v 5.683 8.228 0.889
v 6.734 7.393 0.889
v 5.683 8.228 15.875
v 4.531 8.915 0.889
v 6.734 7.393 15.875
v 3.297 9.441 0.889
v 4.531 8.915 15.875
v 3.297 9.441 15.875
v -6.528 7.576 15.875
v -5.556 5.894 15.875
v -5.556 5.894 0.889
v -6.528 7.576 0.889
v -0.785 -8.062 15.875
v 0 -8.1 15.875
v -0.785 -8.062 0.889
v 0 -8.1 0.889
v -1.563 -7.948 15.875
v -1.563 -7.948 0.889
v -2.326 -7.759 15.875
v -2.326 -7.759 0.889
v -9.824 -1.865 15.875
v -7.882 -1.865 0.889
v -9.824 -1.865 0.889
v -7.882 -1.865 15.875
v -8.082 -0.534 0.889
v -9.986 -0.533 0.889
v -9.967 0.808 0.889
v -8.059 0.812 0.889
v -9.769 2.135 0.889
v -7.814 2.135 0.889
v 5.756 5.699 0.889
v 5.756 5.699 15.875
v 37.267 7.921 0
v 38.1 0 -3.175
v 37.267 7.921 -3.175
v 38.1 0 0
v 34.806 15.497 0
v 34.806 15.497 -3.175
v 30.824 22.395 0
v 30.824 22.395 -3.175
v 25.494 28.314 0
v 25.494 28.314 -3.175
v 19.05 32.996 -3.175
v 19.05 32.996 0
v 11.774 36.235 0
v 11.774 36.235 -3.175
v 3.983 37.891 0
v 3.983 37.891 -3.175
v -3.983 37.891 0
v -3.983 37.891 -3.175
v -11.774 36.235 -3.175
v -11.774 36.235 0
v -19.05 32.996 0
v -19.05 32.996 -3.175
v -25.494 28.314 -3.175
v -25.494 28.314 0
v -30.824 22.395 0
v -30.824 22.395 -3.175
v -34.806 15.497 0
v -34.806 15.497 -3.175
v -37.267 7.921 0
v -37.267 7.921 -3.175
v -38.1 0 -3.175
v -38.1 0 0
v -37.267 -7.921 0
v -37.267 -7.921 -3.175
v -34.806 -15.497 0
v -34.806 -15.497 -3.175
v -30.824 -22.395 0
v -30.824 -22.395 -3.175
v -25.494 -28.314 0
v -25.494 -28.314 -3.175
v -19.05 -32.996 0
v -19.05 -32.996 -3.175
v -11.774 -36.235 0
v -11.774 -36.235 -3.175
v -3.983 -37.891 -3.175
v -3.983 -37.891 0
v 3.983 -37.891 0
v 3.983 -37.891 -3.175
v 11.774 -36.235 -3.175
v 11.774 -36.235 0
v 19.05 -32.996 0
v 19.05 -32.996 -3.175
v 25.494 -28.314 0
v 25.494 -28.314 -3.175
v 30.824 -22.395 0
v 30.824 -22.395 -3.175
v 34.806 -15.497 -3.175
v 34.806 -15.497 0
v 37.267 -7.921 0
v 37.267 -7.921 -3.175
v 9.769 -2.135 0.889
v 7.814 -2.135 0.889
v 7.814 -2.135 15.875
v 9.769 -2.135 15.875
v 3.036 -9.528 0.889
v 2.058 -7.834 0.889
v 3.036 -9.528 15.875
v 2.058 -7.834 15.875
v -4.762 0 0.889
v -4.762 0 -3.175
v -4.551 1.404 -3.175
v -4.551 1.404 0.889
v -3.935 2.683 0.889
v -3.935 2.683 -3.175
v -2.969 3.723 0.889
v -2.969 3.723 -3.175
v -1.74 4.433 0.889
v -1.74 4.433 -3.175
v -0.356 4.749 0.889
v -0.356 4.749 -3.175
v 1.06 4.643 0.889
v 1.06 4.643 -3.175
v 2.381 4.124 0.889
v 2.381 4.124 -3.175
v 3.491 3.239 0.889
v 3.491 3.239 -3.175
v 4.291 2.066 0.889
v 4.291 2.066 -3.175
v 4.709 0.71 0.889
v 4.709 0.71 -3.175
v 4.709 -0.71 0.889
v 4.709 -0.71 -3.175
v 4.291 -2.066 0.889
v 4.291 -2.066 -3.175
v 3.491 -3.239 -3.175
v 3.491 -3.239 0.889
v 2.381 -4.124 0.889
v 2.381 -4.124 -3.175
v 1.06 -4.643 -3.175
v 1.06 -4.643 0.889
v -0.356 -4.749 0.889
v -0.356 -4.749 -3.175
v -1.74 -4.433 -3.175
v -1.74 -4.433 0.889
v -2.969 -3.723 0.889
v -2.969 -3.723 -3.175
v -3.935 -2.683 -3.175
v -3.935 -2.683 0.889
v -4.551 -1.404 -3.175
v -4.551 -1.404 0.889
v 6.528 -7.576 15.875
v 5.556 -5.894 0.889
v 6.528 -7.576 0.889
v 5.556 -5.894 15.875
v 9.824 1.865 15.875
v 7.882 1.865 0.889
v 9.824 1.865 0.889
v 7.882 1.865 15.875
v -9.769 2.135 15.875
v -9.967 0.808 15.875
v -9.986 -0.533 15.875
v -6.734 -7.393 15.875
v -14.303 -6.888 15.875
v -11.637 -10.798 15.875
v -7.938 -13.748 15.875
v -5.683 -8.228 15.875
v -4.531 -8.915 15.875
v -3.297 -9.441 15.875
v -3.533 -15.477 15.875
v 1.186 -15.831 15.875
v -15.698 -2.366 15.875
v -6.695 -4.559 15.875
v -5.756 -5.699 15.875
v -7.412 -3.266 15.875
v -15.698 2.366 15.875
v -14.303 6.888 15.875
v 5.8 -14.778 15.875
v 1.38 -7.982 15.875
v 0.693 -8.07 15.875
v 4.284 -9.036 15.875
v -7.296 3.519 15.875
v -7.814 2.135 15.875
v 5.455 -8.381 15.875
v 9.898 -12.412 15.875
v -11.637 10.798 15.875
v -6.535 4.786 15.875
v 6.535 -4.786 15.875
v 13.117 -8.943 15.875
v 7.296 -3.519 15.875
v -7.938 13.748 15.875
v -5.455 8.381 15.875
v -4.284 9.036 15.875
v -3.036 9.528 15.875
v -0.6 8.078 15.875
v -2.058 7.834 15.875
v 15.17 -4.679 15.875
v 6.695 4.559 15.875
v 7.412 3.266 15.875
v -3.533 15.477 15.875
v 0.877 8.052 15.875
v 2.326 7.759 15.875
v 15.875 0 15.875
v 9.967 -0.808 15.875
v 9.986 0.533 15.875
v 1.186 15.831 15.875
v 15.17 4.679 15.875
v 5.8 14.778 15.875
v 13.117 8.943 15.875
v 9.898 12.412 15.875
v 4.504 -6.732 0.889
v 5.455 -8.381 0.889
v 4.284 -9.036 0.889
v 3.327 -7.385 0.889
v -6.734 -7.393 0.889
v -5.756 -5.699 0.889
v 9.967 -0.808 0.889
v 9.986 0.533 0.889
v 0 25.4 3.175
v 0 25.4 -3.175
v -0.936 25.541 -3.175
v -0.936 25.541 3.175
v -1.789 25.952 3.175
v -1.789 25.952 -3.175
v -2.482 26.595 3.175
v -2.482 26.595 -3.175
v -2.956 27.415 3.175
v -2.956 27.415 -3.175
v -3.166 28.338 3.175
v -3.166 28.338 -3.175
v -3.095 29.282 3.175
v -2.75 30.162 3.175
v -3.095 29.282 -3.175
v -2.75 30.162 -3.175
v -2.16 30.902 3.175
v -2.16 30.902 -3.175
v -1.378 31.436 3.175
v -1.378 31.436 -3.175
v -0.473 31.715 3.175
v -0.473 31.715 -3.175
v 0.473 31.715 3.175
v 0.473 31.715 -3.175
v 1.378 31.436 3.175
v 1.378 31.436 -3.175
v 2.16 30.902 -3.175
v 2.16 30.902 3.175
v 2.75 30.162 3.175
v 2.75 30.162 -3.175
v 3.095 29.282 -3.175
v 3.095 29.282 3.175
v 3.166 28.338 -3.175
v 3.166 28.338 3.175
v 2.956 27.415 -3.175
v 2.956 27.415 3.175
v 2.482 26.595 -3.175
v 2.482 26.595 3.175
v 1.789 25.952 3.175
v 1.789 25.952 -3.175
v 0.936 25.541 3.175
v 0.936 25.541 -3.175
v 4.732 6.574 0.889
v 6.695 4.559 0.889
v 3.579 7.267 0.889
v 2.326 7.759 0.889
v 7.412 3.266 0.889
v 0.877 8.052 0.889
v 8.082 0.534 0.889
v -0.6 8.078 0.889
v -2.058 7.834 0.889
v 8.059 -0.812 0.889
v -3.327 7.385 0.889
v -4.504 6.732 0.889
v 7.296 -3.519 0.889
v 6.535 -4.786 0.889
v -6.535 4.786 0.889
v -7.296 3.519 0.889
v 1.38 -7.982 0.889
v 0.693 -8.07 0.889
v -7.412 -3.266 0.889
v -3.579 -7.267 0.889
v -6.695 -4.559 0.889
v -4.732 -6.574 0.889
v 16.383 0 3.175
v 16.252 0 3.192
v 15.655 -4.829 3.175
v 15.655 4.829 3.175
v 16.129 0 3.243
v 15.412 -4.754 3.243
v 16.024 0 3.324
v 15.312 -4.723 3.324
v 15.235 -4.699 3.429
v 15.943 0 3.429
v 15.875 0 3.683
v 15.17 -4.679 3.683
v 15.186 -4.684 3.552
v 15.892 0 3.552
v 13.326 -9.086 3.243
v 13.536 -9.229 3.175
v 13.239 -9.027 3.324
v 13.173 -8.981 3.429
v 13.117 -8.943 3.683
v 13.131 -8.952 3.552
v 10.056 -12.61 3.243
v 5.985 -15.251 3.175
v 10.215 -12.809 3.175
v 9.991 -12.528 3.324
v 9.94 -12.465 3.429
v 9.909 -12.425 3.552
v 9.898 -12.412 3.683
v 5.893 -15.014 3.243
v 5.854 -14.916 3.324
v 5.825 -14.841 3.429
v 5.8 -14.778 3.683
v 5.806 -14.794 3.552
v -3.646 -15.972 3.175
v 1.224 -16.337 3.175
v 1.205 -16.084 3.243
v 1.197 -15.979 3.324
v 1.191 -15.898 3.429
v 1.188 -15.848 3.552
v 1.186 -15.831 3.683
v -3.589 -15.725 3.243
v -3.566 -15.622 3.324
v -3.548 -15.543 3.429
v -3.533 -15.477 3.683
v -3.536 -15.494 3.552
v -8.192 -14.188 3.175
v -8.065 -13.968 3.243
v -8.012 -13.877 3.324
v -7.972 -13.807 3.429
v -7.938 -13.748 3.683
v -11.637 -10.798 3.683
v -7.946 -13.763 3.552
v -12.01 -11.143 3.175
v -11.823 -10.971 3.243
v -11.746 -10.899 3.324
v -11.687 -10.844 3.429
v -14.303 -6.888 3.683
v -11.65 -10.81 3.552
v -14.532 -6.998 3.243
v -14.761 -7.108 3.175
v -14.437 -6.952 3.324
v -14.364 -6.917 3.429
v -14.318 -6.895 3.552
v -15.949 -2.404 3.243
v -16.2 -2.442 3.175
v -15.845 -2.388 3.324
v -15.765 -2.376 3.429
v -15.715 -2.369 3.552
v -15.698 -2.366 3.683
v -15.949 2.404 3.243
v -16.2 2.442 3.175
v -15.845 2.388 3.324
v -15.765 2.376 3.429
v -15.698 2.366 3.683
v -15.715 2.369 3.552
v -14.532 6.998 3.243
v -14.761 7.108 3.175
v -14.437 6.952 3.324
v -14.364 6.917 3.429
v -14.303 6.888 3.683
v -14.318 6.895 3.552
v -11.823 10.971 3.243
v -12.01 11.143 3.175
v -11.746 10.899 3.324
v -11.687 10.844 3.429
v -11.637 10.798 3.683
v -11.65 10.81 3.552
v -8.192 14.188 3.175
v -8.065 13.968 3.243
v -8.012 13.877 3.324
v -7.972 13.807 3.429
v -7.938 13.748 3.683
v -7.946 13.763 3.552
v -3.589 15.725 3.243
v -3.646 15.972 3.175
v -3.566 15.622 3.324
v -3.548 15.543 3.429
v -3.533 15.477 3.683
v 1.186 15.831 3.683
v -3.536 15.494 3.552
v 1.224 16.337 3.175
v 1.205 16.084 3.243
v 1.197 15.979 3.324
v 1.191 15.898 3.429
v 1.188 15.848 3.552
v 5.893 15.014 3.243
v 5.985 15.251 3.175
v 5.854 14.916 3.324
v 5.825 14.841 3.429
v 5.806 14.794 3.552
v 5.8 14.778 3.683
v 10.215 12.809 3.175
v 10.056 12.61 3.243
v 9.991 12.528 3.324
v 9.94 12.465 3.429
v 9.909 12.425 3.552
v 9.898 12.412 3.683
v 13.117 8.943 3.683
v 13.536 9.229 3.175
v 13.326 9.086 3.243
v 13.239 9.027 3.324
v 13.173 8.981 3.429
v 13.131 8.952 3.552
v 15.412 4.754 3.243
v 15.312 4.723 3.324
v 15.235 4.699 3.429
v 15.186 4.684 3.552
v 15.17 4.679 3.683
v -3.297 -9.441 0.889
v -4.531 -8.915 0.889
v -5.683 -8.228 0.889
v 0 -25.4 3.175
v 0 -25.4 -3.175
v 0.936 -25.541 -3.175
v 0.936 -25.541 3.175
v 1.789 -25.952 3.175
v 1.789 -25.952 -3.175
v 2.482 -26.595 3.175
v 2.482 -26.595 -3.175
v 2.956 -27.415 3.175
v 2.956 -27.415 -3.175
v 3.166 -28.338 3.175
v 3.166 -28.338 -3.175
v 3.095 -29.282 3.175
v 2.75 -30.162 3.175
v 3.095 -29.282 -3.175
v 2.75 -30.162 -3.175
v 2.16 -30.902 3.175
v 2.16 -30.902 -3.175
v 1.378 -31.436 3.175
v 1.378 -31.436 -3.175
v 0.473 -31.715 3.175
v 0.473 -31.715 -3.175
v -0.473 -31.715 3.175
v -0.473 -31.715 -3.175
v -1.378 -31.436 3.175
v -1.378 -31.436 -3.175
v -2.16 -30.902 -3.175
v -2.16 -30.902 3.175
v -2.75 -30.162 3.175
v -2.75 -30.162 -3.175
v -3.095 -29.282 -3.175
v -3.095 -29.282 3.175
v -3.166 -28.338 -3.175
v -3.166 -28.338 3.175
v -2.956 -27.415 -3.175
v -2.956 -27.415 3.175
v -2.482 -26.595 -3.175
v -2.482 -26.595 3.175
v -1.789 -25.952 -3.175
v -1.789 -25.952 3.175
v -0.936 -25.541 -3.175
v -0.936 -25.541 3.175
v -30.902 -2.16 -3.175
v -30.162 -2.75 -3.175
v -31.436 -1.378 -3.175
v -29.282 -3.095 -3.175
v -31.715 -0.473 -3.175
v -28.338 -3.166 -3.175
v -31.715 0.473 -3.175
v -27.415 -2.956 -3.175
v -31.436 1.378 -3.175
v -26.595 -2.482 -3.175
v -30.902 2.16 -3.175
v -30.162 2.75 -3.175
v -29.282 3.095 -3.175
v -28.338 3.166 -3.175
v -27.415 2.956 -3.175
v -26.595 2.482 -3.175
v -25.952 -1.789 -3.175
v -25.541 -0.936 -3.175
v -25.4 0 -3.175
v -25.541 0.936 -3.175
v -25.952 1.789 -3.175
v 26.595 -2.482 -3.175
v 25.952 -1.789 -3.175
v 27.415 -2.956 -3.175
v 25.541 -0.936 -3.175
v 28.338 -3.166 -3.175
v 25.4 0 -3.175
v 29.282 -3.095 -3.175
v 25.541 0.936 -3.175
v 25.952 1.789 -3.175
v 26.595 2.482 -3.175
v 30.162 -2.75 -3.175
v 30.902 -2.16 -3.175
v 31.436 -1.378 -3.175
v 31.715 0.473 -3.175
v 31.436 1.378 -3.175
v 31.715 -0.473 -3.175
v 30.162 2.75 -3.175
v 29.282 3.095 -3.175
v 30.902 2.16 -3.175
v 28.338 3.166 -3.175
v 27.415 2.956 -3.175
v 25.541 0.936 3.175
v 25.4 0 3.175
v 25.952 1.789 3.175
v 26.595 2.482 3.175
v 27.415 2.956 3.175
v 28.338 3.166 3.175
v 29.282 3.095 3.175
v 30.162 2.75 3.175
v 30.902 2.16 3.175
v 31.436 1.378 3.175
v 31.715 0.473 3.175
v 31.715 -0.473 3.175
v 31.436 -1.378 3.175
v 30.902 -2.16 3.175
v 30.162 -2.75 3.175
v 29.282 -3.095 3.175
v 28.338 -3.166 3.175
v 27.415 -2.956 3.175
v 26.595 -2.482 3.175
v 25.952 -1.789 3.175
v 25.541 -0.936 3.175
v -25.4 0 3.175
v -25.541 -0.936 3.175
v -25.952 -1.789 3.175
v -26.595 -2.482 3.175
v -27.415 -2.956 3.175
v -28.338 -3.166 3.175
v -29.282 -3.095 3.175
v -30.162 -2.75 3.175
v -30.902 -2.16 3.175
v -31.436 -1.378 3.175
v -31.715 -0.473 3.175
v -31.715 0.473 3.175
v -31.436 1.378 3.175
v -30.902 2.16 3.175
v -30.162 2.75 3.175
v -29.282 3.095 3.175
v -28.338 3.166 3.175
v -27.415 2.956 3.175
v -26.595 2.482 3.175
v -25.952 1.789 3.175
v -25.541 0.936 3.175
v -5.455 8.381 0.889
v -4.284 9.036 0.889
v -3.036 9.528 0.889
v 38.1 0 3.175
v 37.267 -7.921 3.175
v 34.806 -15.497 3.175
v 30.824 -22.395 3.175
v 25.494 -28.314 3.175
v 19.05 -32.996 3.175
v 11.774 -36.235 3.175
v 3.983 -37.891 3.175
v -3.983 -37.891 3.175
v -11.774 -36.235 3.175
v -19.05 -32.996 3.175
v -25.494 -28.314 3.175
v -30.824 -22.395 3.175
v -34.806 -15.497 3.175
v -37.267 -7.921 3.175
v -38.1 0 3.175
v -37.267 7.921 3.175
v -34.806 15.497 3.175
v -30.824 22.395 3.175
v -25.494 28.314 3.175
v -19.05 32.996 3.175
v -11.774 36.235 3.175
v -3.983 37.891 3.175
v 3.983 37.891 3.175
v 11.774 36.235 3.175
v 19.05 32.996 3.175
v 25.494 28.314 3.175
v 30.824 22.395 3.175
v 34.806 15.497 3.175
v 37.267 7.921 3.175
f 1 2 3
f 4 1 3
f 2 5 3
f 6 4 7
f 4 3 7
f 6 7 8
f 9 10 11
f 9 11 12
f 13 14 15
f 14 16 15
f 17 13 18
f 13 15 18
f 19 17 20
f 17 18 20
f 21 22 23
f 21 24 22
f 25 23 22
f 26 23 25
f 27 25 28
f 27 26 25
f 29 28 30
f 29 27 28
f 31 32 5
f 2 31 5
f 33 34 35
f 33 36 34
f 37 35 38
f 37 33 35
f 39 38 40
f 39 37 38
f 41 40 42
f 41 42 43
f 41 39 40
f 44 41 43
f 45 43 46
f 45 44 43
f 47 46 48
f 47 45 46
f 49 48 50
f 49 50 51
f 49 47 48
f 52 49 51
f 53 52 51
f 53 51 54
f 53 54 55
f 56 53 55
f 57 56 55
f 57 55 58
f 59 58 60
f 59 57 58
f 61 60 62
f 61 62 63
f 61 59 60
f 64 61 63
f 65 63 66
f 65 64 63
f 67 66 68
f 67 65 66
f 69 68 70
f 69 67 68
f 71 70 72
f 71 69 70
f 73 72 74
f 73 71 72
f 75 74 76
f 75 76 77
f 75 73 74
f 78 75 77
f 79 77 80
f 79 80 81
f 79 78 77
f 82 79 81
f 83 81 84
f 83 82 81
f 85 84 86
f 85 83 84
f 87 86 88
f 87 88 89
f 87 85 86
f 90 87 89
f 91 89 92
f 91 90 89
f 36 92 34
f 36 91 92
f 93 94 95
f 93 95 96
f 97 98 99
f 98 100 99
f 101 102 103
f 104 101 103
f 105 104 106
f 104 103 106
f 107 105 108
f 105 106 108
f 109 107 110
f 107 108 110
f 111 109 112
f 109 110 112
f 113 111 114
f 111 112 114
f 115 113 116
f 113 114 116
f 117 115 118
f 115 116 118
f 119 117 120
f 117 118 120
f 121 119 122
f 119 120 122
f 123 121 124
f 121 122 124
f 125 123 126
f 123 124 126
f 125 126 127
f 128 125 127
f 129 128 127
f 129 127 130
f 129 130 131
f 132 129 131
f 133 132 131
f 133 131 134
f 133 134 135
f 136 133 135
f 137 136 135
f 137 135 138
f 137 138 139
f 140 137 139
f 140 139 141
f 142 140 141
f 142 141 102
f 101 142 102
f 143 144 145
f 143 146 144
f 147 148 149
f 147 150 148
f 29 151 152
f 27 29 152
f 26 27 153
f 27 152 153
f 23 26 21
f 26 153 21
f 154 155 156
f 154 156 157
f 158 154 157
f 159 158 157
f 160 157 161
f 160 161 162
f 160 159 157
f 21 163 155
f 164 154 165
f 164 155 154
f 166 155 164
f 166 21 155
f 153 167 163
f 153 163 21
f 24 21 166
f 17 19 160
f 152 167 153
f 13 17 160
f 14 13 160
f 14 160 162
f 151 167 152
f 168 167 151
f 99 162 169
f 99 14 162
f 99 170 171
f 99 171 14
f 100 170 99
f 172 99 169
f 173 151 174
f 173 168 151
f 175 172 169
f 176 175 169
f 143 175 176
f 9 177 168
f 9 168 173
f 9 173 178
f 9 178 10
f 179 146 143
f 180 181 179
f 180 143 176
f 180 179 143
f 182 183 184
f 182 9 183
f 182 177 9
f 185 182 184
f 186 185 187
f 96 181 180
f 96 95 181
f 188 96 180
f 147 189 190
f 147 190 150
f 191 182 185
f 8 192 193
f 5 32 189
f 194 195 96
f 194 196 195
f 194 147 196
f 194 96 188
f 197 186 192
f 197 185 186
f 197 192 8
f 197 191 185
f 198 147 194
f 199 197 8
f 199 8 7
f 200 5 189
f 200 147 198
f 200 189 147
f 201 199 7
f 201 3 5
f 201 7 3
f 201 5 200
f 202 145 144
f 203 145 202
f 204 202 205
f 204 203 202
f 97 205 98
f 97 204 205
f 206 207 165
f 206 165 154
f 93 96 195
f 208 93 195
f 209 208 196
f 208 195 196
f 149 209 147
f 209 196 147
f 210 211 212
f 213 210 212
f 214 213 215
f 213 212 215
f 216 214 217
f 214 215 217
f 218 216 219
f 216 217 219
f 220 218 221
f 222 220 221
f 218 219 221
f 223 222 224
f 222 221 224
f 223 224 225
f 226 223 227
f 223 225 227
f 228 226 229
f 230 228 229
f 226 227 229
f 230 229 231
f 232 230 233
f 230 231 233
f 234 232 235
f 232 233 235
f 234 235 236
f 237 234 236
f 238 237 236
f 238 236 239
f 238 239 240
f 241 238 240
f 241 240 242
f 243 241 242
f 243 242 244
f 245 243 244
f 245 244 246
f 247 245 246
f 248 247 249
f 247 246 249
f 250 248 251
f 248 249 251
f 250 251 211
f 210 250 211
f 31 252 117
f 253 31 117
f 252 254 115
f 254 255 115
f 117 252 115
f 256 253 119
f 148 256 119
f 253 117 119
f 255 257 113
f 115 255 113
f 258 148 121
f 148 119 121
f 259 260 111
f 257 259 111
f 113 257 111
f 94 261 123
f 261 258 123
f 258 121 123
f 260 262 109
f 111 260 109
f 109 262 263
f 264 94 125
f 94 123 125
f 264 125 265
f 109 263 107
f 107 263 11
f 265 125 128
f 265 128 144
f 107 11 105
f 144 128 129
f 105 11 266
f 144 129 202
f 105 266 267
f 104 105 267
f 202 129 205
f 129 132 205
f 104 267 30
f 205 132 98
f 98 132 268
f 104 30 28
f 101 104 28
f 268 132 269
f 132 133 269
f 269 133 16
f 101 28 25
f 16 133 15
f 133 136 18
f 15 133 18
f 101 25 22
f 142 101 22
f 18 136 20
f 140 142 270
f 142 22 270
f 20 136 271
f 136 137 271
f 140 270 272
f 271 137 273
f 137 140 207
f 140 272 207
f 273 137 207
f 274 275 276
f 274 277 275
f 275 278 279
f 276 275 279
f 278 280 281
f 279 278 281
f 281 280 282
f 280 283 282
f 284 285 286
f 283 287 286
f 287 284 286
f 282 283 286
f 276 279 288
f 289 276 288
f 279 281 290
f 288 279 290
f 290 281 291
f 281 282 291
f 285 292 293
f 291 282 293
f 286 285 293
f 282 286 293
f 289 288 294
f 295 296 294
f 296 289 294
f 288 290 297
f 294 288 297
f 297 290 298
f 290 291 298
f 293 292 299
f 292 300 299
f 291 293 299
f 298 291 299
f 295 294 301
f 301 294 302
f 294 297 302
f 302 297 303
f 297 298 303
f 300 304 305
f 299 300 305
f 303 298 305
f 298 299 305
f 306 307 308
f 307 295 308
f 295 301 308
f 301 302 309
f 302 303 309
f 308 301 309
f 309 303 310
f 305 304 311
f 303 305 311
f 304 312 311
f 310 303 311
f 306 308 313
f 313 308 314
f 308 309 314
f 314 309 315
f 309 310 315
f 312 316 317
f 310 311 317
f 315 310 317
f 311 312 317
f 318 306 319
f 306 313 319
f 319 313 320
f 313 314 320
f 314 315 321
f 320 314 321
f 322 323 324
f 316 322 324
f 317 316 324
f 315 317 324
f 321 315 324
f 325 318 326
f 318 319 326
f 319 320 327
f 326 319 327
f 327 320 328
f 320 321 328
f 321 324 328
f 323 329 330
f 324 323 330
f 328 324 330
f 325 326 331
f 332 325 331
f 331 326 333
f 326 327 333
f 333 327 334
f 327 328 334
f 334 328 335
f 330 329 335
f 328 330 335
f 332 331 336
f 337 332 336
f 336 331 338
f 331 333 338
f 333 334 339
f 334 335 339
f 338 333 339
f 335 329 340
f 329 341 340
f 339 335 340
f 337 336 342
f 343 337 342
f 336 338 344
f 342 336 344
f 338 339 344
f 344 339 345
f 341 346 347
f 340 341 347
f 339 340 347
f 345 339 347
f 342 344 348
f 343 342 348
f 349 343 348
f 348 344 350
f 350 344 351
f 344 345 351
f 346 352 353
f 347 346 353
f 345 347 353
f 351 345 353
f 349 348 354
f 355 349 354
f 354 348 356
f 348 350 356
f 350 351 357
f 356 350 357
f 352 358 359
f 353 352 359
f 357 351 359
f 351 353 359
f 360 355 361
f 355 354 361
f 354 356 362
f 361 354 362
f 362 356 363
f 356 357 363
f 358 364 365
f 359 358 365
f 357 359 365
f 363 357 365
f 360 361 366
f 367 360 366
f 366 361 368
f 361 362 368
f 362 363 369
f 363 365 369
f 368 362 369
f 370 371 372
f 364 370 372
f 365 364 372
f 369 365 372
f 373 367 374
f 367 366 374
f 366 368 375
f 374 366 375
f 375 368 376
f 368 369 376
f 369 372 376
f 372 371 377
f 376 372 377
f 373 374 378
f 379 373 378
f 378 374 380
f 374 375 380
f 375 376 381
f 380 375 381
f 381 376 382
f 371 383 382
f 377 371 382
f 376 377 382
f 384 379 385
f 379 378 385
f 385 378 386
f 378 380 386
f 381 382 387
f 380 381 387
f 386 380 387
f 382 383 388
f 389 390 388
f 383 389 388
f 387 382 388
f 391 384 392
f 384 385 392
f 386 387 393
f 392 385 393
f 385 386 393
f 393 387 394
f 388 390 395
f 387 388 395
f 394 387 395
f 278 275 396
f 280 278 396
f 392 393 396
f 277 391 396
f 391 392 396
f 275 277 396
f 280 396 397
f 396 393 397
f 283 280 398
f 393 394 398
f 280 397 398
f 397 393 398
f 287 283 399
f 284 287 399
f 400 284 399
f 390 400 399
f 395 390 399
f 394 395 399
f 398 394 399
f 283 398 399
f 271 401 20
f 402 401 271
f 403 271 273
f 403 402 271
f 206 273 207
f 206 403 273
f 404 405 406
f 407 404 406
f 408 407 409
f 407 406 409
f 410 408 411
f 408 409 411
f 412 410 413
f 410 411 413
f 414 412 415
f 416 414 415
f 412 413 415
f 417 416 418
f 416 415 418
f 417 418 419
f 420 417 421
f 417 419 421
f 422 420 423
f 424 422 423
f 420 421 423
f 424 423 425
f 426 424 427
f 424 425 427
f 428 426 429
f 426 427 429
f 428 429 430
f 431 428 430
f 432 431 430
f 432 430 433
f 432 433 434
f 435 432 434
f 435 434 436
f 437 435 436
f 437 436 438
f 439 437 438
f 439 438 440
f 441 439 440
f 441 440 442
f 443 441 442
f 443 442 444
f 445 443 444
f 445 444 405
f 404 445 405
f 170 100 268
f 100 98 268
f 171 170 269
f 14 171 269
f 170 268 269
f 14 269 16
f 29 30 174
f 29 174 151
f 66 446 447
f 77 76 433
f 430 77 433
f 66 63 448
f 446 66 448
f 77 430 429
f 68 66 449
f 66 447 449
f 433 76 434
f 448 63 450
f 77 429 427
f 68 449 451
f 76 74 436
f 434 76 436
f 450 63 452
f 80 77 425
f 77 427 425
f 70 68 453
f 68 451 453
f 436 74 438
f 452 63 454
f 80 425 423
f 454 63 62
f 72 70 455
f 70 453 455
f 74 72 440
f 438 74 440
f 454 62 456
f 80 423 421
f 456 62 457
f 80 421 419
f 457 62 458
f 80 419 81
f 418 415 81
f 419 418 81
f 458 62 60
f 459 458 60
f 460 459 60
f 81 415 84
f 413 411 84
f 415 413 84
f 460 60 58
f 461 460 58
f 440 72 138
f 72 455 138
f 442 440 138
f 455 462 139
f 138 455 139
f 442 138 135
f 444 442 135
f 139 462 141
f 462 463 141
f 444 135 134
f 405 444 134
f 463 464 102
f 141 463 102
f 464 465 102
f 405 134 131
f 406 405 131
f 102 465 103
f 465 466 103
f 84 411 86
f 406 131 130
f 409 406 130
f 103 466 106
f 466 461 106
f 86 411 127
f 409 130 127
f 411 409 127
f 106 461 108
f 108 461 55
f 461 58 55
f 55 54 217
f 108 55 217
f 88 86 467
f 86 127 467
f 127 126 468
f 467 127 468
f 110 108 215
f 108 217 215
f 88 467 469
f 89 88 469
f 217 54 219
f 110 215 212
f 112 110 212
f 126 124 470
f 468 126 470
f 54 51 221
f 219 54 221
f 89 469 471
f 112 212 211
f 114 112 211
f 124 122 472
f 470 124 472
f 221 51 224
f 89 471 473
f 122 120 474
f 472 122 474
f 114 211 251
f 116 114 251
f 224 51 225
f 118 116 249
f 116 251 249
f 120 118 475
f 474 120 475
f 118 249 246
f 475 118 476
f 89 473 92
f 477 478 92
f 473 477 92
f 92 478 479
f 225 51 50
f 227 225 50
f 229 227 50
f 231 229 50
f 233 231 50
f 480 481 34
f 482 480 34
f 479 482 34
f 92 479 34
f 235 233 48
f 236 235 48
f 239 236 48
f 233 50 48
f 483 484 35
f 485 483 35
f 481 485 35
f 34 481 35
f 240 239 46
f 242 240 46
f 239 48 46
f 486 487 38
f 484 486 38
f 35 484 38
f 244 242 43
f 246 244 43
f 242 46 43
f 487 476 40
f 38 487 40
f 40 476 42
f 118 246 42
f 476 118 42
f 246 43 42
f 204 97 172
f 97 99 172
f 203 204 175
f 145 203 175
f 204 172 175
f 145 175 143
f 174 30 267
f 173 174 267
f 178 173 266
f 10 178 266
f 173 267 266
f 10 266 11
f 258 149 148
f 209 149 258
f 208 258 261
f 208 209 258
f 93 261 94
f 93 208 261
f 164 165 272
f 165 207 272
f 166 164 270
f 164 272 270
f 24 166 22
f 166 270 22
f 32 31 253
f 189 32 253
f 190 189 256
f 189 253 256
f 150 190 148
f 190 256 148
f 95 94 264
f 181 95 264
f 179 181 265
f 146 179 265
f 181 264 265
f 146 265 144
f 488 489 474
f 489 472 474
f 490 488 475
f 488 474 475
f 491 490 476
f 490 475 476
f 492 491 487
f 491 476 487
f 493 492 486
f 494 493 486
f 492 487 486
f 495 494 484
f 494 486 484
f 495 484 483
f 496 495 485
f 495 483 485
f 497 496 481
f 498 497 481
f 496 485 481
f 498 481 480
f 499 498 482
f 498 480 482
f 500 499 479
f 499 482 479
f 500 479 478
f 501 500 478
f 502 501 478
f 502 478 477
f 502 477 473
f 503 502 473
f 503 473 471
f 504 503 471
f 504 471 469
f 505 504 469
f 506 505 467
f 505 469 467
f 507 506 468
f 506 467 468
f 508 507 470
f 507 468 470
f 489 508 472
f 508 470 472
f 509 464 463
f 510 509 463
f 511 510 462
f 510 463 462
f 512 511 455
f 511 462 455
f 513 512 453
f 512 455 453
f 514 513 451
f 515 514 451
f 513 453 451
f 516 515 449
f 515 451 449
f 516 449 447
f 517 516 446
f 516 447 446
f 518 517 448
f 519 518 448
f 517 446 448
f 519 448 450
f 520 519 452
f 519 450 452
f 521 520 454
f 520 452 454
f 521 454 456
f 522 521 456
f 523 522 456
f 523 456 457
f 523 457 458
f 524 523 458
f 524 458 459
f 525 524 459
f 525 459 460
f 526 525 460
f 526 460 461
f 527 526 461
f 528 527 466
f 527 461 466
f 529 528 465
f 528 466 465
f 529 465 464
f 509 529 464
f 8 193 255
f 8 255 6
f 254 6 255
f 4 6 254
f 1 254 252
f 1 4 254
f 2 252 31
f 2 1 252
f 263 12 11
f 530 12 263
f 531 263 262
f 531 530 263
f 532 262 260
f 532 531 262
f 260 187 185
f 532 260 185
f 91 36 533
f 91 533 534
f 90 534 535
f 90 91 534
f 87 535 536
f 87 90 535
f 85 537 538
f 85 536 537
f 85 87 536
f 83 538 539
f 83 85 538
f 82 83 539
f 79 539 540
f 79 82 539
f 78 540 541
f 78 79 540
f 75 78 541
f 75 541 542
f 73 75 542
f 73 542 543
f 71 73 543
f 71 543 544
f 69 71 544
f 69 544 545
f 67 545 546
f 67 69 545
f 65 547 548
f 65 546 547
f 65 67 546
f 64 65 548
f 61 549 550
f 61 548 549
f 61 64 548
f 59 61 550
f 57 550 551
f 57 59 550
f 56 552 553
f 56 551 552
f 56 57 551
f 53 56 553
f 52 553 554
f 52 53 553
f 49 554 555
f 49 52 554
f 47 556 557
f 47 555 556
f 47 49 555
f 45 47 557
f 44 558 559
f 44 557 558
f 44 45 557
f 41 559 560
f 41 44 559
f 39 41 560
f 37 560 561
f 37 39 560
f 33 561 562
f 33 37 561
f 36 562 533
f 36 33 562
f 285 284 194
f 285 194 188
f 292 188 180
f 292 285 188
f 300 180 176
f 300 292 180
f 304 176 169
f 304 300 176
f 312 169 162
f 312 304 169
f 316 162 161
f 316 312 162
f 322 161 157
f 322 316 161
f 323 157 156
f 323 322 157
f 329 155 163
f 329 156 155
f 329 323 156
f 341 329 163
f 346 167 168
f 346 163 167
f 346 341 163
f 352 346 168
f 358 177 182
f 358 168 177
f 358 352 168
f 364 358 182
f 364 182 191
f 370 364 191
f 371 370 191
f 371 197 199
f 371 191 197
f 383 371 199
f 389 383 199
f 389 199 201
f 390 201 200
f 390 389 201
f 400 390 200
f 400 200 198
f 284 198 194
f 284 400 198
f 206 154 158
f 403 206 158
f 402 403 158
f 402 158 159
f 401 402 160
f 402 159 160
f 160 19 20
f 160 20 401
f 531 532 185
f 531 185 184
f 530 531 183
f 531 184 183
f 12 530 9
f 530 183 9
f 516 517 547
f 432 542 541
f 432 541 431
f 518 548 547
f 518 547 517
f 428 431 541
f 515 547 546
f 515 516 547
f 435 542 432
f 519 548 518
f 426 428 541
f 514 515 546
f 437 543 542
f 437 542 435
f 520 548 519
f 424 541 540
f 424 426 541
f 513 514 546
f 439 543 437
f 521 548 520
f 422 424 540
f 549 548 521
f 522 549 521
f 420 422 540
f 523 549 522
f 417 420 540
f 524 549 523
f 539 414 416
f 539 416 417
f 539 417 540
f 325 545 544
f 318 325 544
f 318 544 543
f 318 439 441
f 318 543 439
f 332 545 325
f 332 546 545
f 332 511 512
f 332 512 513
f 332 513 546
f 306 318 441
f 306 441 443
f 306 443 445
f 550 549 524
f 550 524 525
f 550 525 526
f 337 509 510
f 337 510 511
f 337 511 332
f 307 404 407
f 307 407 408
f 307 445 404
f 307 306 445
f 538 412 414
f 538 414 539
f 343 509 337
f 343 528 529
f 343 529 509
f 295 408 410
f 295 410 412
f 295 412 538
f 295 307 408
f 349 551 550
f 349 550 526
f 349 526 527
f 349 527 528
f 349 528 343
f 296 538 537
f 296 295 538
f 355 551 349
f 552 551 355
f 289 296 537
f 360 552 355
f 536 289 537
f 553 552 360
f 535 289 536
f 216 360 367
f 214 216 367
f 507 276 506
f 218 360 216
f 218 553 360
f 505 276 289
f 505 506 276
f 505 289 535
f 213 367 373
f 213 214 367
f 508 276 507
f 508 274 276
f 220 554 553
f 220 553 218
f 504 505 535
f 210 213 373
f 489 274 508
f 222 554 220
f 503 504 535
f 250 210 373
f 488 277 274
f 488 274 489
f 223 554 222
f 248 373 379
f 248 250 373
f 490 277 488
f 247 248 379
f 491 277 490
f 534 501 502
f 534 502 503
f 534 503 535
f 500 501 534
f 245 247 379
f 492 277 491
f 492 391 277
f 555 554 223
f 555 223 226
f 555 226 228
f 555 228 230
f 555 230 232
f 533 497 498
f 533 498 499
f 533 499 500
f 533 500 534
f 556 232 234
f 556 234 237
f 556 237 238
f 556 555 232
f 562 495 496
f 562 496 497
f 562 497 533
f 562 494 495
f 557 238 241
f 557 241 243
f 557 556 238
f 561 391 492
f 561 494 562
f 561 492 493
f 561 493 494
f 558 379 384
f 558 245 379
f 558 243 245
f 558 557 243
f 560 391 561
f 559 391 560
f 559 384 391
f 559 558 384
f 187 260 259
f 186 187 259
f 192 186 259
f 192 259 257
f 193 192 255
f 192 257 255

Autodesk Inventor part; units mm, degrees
ref_plane "YZ Plane" through (0, 0, 0) normal (1, 0, 0) x (0, 1, 0)
ref_plane "XZ Plane" through (0, 0, 0) normal (0, 1, 0) x (-1, 0, 0)
ref_plane "XY Plane" through (0, 0, 0) normal (0, 0, 1) x (1, 0, 0)
sketch "Sketch1" plane through (0, 0, 0) normal (0, 0, 1) x (1, 0, 0)
  circle A0 centre (0, 0) radius 38.1
  dimension "d2" = 76.2
extrude "Extrusion1" add sketch "Sketch1" along normal mid plane 6.35
sketch "Sketch2" plane through (0, 0, 3.175) normal (0, 0, 1) x (1, 0, 0)
  circle A0 centre (0, 0) radius 38.1 projected
  point P0 (0, 28.575)
  dimension "d3" = 0
  dimension "d4" = 28.575
hole "Mounting Hole" at (0, 28.575, 3.175) direction (0, 0, -1) diameter 6.35 end through all
pattern_circular "Circular Pattern1" count 4 over 360 about axis through (0, 0, 0) along (0, 0, 1) of "Mounting Hole"
sketch "Sketch3" plane through (0, 0, 3.175) normal (0, 0, 1) x (1, 0, 0)
  circle A0 centre (0, 0) radius 38.1 projected
  circle A1 centre (0, 0) radius 15.875
  dimension "d15" = 31.75
extrude "Extrusion2" add sketch "Sketch3" along normal blind 12.7 contours A1
sketch "Sketch8" plane through (0, 0, 15.875) normal (0, 0, 1) x (1, 0, 0)
  circle A0 centre (0, 0) radius 15.875 projected
hole "Hole3" at (0, 0, 15.875) direction (0, 0, -1) diameter 16.2 depth 14.986
sketch "Sketch4" plane through (0, 0, 15.875) normal (0, 0, 1) x (1, 0, 0)
  arc A0 (-3.0359, 9.528) -> (-6.5275, 7.5757) centre (0, 0) ccw
  circle A1 centre (0, 0) radius 15.875 projected
  line L0 (0, 0) -> (-5, 8.6603) construction
  line L1 (0, 0) -> (-10.16, 0) construction
  line L2 (-2.058, 7.8342) -> (-3.0359, 9.528)
  line L3 (-5.5564, 5.8937) -> (-6.5275, 7.5757)
  arc A2 (-2.058, 7.8342) -> (-5.5564, 5.8937) centre (0, 0) ccw
  circle A3 centre (0, 0) radius 8.1 projected
  dimension "d46" = 60
  dimension "d47" = 4
  dimension "d48" = 20
extrude "Extrusion3" cut sketch "Sketch4" against normal up to surface (14.986 mm away) contours L2 A2 L3 A0
pattern_circular "Circular Pattern2" count 6 over 360 about axis through (0, 0, 0) along (0, 0, 1) of "Extrusion3"
fillet "Fillet1" radius 0.508 1 edges at (-15.875, 0, 3.175)
sketch "Sketch9" plane through (0, 0, -3.175) normal (0, 0, -1) x (-1, 0, 0)
  circle A0 centre (0, 0) radius 38.1 projected
  circle A1 centre (0, 0) radius 4.7625
  dimension "d56" = 9.525
extrude "Extrusion6" cut sketch "Sketch9" against normal blind 25.4 contours A1
properties part number "Denso-6" material "ABS Plastic"
